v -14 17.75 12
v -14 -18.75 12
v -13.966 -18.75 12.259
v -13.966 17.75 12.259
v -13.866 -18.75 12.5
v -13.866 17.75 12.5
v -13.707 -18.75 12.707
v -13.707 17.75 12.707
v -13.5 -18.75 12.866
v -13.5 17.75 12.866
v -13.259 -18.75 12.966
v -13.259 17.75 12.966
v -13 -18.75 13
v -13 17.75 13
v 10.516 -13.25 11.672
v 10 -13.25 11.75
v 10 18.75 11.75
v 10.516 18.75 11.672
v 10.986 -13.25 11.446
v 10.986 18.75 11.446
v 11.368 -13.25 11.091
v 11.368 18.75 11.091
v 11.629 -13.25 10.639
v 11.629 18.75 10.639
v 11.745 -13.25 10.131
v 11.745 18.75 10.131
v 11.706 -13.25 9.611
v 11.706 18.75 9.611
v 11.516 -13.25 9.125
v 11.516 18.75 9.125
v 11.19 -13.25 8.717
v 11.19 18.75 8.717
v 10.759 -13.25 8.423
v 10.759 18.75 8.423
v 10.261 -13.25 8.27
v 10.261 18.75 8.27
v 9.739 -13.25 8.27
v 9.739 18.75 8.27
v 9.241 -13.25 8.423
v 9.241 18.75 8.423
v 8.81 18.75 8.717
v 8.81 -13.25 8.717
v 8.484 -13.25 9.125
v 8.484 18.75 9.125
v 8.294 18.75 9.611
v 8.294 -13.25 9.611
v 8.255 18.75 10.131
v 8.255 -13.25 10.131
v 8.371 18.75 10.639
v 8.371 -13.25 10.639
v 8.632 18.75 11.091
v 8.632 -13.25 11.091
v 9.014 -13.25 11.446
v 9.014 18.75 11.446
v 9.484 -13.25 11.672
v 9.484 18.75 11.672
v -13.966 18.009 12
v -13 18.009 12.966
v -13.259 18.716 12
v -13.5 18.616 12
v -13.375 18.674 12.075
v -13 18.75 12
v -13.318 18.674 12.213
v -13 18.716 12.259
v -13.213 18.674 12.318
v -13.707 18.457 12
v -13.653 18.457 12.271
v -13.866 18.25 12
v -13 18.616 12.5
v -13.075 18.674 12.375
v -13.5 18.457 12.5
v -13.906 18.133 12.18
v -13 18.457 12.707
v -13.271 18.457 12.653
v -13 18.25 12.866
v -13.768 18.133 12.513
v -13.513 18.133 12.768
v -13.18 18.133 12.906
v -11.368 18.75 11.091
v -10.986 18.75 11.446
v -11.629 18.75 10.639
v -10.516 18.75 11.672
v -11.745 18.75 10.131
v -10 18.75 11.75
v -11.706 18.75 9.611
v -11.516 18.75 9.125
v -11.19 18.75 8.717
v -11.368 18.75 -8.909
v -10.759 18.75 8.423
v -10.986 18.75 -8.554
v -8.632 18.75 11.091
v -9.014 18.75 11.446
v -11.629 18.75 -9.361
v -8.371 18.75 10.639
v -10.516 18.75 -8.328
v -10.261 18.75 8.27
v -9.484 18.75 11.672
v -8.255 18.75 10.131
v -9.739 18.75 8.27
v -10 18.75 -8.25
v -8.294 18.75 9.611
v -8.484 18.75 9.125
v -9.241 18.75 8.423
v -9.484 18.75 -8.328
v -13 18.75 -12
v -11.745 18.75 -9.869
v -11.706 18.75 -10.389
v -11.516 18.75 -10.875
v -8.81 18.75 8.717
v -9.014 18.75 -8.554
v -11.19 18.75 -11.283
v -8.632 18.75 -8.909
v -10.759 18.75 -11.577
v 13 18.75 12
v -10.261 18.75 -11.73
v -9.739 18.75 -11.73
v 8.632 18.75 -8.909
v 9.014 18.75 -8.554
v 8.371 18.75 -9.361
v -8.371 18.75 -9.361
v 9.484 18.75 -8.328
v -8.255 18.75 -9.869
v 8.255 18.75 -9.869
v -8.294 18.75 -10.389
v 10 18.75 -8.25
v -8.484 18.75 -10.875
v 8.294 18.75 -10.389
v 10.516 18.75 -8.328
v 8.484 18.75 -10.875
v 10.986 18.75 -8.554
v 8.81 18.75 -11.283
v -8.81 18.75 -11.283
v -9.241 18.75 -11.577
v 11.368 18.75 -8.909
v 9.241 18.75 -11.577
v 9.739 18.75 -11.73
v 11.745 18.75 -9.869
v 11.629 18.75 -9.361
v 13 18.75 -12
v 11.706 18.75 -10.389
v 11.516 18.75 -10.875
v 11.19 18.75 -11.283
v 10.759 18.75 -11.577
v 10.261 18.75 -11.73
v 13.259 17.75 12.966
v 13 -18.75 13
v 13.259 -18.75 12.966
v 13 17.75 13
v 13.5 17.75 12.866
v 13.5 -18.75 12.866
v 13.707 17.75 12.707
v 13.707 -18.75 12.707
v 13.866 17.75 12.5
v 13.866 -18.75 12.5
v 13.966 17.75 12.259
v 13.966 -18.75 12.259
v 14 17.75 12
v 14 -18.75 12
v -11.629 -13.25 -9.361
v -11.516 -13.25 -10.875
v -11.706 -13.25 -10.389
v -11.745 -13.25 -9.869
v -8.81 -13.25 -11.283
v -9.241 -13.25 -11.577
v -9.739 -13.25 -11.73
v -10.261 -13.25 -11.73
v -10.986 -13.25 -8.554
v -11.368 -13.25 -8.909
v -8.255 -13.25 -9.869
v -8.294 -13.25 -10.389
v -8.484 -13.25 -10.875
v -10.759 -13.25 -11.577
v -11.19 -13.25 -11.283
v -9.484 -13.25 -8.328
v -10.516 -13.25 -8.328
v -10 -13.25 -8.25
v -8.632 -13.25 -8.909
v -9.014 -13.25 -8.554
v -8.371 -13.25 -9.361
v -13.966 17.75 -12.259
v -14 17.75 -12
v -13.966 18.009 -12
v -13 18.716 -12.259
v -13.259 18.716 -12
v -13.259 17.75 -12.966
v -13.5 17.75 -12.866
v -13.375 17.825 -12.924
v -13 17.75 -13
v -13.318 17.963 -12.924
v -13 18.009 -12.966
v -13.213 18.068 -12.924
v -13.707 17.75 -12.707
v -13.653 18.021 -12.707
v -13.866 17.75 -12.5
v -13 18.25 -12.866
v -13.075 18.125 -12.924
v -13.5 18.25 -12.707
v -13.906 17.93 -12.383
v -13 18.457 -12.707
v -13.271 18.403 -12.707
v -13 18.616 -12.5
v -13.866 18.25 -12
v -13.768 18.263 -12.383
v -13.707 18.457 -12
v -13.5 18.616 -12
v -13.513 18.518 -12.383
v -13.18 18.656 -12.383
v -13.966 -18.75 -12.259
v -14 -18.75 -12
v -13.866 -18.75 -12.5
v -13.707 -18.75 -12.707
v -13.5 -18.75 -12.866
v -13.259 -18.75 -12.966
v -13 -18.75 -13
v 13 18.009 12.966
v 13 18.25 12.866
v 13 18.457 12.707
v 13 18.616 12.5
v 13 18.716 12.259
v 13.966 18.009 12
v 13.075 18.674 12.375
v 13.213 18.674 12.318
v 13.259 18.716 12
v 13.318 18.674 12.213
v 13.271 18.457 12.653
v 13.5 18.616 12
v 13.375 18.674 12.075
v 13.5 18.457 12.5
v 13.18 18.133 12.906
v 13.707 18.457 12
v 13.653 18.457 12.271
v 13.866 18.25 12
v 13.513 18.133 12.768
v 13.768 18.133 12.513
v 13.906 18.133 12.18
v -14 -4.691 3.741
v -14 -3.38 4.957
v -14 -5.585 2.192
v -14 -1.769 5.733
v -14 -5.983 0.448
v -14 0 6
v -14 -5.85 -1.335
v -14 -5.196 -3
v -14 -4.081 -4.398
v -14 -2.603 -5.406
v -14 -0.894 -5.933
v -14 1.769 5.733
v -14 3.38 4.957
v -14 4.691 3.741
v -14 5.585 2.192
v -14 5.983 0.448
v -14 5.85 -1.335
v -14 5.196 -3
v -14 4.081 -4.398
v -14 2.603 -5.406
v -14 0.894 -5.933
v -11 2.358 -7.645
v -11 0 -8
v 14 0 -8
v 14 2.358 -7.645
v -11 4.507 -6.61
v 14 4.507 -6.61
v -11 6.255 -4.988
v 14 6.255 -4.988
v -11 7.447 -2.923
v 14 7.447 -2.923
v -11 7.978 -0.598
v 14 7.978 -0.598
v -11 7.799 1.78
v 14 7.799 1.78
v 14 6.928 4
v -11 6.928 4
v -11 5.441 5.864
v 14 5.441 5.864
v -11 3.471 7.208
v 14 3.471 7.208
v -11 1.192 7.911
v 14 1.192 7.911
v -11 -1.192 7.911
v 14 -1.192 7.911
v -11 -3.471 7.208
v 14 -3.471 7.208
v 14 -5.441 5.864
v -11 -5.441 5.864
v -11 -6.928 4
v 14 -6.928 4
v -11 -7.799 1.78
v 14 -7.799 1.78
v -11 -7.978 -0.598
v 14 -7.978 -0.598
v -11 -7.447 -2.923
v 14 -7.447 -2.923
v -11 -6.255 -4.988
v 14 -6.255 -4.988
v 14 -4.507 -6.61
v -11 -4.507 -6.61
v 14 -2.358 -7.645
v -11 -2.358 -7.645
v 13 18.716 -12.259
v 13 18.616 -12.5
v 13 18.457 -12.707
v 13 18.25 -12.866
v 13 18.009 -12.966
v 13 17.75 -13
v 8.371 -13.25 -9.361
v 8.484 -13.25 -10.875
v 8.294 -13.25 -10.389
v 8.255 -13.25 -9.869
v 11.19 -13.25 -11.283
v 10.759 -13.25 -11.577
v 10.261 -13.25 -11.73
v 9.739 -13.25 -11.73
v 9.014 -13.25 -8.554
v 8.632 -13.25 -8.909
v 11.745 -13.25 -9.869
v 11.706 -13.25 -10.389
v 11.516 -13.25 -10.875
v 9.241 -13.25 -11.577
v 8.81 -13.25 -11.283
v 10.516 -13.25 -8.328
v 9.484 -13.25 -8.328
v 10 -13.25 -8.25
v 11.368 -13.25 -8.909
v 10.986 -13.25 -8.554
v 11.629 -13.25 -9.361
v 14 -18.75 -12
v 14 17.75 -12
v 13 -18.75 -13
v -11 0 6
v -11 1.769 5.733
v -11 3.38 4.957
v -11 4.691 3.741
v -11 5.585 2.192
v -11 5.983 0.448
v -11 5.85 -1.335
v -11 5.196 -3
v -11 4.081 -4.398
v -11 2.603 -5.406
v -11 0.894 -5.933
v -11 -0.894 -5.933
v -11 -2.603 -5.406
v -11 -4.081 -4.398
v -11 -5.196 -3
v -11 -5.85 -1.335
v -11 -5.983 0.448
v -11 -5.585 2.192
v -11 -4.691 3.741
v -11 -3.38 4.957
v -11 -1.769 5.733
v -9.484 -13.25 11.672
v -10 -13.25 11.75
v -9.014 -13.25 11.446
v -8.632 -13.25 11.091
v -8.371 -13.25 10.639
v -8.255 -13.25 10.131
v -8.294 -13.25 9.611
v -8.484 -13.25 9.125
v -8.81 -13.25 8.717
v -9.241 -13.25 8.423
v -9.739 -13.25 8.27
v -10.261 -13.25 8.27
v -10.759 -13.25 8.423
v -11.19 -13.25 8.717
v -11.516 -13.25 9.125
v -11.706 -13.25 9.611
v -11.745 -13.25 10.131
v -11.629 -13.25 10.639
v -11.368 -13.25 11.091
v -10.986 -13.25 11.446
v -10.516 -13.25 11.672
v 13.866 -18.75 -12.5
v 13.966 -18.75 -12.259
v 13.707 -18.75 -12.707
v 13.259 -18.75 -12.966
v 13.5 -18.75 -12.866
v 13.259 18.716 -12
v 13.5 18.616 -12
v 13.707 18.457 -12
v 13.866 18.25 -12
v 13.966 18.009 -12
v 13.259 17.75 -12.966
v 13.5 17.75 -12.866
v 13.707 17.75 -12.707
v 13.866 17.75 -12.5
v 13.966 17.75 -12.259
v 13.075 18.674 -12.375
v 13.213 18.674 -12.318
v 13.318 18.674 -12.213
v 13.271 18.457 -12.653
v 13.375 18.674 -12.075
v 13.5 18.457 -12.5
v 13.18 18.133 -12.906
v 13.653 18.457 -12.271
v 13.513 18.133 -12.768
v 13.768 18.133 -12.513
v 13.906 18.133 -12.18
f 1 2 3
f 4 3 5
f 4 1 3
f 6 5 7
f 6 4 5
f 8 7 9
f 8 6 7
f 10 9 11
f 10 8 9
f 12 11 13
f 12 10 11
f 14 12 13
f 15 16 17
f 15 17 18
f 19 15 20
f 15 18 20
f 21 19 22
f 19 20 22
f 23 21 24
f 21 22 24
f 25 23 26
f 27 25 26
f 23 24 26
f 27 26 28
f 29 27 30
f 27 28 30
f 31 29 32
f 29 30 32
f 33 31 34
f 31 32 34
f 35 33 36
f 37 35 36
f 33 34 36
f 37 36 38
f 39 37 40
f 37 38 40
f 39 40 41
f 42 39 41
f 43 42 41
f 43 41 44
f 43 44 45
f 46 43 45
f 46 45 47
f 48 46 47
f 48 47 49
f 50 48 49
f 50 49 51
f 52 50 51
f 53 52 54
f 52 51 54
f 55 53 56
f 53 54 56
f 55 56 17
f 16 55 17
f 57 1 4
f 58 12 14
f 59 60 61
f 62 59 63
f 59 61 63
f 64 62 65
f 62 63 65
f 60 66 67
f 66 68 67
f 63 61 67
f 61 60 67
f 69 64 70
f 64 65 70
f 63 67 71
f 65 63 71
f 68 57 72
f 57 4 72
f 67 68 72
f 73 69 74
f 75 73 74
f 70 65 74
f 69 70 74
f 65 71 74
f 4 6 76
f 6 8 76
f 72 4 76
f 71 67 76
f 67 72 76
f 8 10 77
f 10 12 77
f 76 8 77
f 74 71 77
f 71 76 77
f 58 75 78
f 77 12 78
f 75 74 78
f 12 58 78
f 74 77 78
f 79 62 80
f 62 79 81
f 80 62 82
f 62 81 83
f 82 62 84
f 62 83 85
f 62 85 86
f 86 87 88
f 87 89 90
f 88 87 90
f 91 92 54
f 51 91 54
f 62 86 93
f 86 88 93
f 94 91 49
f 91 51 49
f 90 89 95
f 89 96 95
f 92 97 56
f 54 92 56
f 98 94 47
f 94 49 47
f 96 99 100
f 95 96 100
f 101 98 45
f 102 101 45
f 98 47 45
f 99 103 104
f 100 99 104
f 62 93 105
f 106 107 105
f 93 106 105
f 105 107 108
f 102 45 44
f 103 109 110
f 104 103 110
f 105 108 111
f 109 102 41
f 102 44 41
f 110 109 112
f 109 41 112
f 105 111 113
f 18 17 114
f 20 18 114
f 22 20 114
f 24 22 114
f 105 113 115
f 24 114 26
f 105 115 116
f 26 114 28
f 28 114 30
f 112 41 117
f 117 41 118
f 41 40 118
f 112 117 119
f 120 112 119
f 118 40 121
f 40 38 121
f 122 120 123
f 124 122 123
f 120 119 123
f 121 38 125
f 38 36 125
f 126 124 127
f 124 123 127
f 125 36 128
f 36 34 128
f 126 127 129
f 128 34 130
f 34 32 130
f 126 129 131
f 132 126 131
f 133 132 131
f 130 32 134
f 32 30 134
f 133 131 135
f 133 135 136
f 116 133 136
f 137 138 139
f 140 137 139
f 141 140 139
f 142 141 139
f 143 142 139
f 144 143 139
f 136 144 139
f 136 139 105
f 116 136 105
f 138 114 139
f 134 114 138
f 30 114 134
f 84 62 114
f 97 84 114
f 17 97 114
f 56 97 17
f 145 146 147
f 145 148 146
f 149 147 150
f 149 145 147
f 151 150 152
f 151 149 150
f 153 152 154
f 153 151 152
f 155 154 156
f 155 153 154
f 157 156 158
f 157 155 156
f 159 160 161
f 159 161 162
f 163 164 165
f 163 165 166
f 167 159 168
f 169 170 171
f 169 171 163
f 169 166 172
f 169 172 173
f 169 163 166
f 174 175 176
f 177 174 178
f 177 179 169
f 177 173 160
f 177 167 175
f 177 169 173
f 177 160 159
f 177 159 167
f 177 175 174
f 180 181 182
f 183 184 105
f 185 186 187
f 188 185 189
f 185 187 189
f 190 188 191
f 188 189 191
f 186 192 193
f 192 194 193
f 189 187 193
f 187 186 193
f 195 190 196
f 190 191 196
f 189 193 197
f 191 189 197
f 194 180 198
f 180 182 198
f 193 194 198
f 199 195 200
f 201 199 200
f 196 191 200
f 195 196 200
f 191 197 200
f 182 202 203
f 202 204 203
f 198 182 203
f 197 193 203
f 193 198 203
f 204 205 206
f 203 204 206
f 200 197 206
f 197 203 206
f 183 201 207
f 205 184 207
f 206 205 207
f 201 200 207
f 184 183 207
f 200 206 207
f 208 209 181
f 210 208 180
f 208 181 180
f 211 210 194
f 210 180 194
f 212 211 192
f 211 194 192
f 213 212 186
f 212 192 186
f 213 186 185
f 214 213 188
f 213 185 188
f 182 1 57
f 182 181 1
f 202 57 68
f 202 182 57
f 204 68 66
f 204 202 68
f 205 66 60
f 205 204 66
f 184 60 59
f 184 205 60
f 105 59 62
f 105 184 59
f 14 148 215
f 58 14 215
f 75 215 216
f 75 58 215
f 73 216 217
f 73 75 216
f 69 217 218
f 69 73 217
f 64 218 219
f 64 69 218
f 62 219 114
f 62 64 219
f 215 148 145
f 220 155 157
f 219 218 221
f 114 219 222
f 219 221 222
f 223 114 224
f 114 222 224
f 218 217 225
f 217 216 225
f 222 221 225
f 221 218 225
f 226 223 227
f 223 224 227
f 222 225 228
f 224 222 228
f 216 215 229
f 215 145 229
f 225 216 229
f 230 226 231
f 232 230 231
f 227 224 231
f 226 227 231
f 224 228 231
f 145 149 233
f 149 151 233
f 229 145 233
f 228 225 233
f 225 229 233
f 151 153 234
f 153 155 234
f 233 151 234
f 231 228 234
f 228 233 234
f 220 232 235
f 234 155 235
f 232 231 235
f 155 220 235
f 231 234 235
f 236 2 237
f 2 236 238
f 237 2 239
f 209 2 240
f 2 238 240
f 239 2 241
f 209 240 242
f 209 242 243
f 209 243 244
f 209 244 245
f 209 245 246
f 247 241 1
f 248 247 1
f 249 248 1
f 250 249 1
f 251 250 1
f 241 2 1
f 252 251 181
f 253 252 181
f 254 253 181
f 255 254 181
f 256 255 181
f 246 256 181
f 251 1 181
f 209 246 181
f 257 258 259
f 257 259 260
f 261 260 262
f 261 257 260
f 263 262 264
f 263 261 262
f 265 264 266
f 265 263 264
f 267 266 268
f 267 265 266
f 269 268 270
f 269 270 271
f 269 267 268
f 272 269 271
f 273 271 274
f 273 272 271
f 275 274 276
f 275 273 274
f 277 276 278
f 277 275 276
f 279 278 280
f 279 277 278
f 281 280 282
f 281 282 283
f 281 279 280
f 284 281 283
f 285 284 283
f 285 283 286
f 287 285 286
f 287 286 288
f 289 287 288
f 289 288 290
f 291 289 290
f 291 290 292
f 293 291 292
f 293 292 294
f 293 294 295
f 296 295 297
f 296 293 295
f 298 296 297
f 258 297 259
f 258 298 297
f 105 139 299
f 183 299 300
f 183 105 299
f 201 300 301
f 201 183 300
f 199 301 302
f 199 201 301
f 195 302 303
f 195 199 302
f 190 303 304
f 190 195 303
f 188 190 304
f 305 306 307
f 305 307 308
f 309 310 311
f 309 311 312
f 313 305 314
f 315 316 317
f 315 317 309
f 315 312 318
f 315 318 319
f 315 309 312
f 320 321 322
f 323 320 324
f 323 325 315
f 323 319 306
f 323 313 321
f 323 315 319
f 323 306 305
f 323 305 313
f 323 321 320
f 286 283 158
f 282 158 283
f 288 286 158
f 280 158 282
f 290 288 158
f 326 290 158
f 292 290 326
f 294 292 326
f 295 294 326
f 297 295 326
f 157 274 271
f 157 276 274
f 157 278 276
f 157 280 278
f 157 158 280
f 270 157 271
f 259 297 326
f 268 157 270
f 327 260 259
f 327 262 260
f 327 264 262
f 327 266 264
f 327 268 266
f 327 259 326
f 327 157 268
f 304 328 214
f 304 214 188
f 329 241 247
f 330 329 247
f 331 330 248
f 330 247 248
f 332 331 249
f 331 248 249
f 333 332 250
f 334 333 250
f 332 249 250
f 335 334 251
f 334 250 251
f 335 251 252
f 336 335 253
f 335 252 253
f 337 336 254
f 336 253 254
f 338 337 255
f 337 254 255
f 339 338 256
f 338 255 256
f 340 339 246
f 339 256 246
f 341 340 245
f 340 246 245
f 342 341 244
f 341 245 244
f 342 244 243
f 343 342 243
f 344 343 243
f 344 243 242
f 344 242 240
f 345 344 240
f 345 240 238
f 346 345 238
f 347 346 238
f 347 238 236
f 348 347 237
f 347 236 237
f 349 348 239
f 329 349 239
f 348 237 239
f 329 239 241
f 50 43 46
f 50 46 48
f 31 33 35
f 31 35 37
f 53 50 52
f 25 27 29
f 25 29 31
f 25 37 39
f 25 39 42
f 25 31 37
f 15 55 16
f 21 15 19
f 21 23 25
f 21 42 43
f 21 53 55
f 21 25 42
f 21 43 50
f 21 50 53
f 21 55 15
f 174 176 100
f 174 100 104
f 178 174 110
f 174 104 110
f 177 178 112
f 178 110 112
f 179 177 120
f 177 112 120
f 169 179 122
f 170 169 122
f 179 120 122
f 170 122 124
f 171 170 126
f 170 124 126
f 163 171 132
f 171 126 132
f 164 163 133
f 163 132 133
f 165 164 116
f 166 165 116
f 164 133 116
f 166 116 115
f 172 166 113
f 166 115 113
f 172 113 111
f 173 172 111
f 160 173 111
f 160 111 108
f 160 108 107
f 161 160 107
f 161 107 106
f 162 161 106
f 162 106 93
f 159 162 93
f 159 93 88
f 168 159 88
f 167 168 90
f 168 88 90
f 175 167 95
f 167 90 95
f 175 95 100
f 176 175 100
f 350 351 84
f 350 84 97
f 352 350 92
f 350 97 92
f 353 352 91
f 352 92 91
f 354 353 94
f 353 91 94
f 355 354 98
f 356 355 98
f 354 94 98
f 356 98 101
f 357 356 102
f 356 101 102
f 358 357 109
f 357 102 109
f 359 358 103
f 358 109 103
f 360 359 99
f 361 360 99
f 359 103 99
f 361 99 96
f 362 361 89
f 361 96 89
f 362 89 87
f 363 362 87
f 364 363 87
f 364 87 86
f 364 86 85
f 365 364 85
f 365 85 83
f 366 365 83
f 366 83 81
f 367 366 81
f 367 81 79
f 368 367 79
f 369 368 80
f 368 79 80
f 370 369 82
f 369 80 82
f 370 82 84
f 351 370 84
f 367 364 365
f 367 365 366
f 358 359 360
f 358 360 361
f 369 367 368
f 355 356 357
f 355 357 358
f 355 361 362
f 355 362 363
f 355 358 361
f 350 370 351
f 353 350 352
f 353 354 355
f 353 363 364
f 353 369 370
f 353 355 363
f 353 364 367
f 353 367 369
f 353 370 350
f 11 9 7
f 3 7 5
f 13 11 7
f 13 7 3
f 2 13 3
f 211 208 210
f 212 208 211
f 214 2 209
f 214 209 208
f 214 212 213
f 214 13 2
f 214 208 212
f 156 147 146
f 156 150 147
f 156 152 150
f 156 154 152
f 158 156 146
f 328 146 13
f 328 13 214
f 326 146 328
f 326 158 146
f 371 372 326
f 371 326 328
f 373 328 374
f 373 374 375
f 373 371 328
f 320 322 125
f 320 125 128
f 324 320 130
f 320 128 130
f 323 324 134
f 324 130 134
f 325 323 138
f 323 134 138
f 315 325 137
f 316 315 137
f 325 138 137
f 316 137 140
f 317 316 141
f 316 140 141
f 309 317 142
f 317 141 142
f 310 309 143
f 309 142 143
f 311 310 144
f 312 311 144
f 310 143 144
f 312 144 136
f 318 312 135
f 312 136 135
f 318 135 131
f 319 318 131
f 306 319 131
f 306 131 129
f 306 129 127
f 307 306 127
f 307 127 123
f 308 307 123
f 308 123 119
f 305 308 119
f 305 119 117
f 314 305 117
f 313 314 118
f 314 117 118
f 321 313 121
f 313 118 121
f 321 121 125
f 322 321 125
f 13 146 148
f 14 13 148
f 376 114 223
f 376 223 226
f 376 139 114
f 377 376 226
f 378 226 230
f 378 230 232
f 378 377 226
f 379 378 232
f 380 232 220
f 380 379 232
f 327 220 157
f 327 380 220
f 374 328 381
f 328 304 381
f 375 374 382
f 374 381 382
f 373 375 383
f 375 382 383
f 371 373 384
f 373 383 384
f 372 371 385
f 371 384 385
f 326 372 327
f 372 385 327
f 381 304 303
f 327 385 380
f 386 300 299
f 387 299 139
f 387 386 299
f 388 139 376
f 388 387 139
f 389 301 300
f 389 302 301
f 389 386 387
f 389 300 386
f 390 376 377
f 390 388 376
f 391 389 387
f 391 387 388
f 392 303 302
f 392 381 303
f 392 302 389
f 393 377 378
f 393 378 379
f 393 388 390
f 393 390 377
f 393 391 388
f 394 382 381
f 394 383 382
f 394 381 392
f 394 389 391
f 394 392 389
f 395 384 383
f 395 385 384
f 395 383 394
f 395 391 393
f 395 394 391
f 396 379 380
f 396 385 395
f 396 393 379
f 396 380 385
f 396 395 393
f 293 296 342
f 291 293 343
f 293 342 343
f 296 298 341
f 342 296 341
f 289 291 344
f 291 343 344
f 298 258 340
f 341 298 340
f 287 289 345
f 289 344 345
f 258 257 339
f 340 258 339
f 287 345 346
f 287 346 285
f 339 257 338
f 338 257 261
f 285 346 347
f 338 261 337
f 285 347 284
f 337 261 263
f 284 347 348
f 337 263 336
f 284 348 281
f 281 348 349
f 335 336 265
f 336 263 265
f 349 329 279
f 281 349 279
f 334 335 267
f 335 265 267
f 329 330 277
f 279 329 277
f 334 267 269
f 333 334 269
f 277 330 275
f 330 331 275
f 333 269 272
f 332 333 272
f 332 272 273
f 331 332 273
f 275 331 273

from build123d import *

# Parameters (mm, degrees)
SKETCH1_W           = 26
SKETCH1_H           = 37.5
SKETCH1_R           = 8
BOSS_EXTRUDE1_DEPTH = 14
SKETCH2_R           = 1.75
CUT_EXTRUDE1_DEPTH  = 32
SKETCH5_R           = 8.35
SKETCH5_R_2         = 6
BOSS_EXTRUDE3_DEPTH = 3
FILLET3_R           = 1


with BuildPart() as part:
    # Sketch1 → Boss-Extrude1 (new, symmetric)
    with BuildSketch(Plane(origin=(0, 0, 0), x_dir=(0, 0, -1), z_dir=(1, 0, 0))):
        Rectangle(SKETCH1_W, SKETCH1_H)
        Circle(SKETCH1_R, mode=Mode.SUBTRACT)
    extrude(amount=BOSS_EXTRUDE1_DEPTH, both=True)

    # Sketch2 → Cut-Extrude1 (cut)
    with BuildSketch(Plane(origin=(0, 18.75, 0), x_dir=(1, 0, 0), z_dir=(0, 1, 0))):
        with Locations(Location((-10, 10, 0), (0, 0, 270))):
            Circle(SKETCH2_R)
        with Locations(Location((10, 10, 0), (0, 0, 270))):
            Circle(SKETCH2_R)
        with Locations(Location((10, -10, 0), (0, 0, 270))):
            Circle(SKETCH2_R)
        with Locations(Location((-10, -10, 0), (0, 0, 270))):
            Circle(SKETCH2_R)
    extrude(amount=-CUT_EXTRUDE1_DEPTH, mode=Mode.SUBTRACT)

    # Sketch5 → Boss-Extrude3 (add)
    with BuildSketch(Plane.ZY.offset(14)):
        Circle(SKETCH5_R)
        Circle(SKETCH5_R_2, mode=Mode.SUBTRACT)
    extrude(amount=-BOSS_EXTRUDE3_DEPTH)

    # Fillet3
    fillet3_edges = [part.edges().sort_by_distance(p)[0] for p in [
        (14, 0, 13),
        (14, 0, -13),
        (-14, 0, 13),
        (-14, 18.75, 0),
        (-14, 0, -13),
        (0, 18.75, 13),
        (0, 18.75, -13),
        (14, 18.75, 0),
    ]]
    fillet(fillet3_edges, radius=FILLET3_R)


solid = part.part
